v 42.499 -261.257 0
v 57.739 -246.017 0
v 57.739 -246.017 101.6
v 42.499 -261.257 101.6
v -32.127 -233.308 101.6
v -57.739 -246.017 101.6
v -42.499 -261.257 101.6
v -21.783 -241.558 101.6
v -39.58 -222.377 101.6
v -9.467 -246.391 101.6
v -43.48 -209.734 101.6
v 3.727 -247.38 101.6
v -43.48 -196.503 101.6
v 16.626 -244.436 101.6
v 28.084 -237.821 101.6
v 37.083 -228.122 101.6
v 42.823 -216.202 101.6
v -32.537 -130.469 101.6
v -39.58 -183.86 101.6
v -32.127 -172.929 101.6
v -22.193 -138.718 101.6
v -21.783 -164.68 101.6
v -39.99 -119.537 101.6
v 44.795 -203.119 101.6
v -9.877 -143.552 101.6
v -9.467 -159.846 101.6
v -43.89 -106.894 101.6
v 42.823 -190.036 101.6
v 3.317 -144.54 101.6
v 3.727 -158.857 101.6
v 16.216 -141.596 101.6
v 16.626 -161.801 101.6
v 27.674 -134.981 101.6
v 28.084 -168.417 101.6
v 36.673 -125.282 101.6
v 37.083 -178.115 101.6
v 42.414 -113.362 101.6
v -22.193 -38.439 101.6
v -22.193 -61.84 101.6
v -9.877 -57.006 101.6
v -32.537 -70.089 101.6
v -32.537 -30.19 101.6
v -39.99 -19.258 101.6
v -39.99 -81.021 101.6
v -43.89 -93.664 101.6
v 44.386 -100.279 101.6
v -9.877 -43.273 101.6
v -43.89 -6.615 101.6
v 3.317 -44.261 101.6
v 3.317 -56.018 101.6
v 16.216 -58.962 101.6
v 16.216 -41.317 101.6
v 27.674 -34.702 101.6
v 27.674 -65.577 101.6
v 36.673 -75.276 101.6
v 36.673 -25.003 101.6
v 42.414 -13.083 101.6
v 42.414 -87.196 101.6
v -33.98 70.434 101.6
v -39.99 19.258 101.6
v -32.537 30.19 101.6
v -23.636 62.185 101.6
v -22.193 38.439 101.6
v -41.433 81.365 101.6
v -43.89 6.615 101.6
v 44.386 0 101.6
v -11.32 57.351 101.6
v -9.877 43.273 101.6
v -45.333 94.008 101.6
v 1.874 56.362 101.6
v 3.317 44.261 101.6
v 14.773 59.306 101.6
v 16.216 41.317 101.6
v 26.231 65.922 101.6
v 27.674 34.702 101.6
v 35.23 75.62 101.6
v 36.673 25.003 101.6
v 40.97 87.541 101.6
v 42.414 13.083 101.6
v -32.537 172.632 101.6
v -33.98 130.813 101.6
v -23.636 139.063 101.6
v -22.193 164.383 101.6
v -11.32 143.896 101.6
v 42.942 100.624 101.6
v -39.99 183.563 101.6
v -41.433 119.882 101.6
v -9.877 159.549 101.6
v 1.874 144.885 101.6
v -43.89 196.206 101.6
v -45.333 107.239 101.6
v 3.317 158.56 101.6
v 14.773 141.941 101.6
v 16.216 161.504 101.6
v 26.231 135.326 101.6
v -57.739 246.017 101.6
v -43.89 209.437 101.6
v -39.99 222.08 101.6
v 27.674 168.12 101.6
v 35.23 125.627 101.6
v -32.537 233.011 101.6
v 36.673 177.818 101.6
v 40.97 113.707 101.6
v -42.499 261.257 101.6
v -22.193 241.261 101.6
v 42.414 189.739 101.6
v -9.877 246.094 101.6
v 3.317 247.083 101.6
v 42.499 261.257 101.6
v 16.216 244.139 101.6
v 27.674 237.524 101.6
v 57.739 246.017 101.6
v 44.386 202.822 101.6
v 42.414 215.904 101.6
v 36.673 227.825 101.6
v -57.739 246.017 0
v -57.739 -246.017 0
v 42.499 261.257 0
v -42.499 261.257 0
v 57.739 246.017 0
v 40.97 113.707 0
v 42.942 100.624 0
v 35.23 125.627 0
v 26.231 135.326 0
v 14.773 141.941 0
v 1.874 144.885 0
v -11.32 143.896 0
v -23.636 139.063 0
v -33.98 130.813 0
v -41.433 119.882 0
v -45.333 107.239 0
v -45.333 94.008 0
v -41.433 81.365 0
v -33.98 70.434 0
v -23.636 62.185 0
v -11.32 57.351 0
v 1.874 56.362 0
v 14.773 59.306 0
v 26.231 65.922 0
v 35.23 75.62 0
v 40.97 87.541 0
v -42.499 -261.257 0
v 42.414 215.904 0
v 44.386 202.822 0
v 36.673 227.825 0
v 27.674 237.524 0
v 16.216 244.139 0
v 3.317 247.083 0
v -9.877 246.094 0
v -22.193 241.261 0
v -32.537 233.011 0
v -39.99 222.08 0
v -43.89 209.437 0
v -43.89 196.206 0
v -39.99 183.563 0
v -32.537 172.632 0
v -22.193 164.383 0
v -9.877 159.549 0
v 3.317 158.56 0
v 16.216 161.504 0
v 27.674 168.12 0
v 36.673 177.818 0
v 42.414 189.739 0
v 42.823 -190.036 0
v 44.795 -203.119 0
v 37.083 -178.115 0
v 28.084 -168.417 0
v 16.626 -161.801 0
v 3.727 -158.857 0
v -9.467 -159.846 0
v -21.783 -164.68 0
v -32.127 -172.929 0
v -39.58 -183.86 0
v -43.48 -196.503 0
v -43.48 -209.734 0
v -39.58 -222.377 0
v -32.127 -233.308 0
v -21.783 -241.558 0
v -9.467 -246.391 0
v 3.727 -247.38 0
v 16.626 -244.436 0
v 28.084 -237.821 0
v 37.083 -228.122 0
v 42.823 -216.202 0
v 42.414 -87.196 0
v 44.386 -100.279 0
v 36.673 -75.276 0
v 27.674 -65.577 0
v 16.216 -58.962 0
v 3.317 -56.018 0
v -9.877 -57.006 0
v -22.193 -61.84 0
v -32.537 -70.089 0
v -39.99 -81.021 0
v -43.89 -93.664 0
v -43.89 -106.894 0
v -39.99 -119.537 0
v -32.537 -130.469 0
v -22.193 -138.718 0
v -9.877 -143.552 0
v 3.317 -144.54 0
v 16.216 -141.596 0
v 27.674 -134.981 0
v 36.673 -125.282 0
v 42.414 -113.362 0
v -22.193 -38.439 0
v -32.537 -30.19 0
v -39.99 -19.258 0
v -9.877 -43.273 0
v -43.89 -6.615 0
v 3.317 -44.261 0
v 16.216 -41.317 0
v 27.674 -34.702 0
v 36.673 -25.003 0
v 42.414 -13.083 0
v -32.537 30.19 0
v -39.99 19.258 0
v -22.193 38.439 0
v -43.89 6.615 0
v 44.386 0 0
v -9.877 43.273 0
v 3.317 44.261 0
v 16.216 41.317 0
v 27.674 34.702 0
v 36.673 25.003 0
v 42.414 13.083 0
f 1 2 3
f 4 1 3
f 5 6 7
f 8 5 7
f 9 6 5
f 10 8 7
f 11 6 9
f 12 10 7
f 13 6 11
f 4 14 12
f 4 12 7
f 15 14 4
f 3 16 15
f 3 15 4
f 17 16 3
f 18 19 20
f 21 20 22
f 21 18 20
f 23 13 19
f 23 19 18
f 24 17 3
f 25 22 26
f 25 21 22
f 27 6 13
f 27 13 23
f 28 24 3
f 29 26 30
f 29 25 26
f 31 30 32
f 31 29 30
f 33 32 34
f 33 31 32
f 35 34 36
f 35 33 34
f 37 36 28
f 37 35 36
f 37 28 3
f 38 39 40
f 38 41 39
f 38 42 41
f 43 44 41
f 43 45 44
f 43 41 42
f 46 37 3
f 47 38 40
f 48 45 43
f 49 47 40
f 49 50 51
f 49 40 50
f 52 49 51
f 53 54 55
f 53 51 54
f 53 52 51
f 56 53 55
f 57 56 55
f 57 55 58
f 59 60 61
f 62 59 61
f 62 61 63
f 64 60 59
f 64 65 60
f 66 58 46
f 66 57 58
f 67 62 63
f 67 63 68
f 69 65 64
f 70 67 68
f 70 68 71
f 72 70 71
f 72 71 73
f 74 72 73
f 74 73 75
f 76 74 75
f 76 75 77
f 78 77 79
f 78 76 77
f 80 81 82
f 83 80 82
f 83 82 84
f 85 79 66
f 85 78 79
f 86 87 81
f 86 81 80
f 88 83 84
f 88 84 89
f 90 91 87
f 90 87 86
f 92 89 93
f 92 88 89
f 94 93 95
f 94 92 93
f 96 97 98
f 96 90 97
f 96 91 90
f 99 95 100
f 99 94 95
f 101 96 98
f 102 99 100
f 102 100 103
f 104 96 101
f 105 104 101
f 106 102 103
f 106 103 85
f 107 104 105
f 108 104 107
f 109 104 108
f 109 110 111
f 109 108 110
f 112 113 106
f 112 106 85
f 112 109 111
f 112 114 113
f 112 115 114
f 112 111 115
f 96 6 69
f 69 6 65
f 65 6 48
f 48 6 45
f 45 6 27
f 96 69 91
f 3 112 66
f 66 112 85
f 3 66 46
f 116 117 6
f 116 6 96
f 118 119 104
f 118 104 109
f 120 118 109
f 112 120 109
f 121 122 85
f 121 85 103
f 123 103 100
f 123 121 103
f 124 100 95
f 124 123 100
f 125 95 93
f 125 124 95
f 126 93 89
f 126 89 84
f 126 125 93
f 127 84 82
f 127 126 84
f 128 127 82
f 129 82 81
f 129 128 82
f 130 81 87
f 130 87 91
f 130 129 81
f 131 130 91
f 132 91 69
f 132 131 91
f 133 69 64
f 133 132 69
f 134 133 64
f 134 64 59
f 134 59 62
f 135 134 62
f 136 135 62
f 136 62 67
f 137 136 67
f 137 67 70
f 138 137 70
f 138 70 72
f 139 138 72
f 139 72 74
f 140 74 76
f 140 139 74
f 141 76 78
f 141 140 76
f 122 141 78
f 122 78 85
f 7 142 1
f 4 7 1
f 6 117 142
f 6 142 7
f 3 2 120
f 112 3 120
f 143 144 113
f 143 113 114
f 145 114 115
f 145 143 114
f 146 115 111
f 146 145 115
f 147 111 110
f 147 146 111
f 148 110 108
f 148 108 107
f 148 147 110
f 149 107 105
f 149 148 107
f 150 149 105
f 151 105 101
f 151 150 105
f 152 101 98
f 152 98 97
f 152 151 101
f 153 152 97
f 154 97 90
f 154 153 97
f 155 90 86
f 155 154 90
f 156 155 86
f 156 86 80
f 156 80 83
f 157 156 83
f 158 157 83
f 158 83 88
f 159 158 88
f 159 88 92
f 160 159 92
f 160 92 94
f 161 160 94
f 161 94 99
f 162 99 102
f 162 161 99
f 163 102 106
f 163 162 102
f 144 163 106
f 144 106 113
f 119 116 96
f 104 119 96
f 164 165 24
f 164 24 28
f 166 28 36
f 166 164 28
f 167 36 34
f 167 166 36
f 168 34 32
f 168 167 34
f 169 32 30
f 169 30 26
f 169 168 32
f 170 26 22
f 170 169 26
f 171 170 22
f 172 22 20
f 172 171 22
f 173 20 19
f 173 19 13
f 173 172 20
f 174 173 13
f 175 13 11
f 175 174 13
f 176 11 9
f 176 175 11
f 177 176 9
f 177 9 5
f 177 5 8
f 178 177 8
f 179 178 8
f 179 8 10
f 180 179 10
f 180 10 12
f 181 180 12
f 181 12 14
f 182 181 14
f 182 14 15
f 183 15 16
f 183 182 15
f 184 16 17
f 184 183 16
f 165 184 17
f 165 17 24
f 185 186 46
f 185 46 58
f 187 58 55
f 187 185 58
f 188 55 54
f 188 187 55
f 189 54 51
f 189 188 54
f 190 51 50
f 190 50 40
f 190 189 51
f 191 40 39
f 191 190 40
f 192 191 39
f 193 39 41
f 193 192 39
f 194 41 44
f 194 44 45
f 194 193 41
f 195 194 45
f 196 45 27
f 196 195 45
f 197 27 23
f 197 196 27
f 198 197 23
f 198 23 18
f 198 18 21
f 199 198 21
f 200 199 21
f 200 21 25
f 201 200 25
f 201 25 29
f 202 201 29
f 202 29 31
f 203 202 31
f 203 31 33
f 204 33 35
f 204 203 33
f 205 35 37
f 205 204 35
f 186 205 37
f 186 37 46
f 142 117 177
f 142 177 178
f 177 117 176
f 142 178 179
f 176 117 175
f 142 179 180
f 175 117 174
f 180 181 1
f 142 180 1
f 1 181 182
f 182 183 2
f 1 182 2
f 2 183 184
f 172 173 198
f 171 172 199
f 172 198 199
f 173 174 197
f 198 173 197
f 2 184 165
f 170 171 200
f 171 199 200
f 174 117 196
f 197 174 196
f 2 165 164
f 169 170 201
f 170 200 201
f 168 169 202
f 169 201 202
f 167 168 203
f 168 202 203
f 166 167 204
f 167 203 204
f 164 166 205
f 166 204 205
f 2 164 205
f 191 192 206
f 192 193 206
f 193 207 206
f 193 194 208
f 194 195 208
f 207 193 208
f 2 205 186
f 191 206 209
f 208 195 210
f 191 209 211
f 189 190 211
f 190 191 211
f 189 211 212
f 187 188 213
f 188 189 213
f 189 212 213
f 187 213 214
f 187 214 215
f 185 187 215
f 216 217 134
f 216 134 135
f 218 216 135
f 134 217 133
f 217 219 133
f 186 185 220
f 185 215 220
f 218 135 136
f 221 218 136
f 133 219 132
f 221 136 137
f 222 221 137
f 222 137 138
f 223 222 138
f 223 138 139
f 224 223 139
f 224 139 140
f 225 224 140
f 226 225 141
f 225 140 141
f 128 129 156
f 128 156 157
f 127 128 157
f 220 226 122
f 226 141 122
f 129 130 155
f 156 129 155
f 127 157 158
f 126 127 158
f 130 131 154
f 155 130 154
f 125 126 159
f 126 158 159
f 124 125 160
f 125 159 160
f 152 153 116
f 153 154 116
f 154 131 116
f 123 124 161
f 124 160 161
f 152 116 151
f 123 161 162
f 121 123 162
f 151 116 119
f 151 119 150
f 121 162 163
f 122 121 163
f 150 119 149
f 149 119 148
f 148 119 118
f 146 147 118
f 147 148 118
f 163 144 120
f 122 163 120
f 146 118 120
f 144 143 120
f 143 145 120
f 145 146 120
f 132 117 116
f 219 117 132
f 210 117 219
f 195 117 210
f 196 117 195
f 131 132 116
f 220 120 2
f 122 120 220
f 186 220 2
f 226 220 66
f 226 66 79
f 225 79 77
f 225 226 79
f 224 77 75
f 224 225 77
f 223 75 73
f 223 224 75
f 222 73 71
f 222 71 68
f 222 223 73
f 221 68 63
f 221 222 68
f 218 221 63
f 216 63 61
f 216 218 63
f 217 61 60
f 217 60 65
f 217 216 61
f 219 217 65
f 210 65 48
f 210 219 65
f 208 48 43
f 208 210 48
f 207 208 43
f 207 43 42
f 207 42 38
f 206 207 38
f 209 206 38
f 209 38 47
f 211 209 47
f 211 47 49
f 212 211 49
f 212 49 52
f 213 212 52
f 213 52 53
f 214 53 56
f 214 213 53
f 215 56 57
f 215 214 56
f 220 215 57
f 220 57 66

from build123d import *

# Parameters (mm, degrees)
F0_W     = 115.478478
F0_H     = 522.514462
F0_R     = 44.385544
F1_DEPTH = 101.6
F2_SIZE  = 15.24
F3_SIZE  = 15.24
F4_SIZE  = 15.24
F5_SIZE  = 15.24


with BuildPart() as f1:
    # F0 (on Top) → F1 (new body)
    with BuildSketch(Plane.XY):
        Rectangle(F0_W, F0_H)
        with Locations((0, -100.278944)):
            Circle(F0_R, mode=Mode.SUBTRACT)
        with Locations((0.409667, -203.118652)):
            Circle(F0_R, mode=Mode.SUBTRACT)
        Circle(F0_R, mode=Mode.SUBTRACT)
        with Locations((-1.443157, 100.623645)):
            Circle(F0_R, mode=Mode.SUBTRACT)
        with Locations((0, 202.821597)):
            Circle(F0_R, mode=Mode.SUBTRACT)
    extrude(amount=F1_DEPTH)

    # F2
    f2_edges = [f1.edges().sort_by_distance(p)[0] for p in [
        (57.739239, -261.257231, 50.8),
    ]]
    chamfer(f2_edges, length=F2_SIZE)

    # F3
    f3_edges = [f1.edges().sort_by_distance(p)[0] for p in [
        (-57.739239, -261.257231, 50.8),
    ]]
    chamfer(f3_edges, length=F3_SIZE)

    # F4
    f4_edges = [f1.edges().sort_by_distance(p)[0] for p in [
        (57.739239, 261.257231, 50.8),
    ]]
    chamfer(f4_edges, length=F4_SIZE)

    # F5
    f5_edges = [f1.edges().sort_by_distance(p)[0] for p in [
        (-57.739239, 261.257231, 50.8),
    ]]
    chamfer(f5_edges, length=F5_SIZE)


solid = f1.part
